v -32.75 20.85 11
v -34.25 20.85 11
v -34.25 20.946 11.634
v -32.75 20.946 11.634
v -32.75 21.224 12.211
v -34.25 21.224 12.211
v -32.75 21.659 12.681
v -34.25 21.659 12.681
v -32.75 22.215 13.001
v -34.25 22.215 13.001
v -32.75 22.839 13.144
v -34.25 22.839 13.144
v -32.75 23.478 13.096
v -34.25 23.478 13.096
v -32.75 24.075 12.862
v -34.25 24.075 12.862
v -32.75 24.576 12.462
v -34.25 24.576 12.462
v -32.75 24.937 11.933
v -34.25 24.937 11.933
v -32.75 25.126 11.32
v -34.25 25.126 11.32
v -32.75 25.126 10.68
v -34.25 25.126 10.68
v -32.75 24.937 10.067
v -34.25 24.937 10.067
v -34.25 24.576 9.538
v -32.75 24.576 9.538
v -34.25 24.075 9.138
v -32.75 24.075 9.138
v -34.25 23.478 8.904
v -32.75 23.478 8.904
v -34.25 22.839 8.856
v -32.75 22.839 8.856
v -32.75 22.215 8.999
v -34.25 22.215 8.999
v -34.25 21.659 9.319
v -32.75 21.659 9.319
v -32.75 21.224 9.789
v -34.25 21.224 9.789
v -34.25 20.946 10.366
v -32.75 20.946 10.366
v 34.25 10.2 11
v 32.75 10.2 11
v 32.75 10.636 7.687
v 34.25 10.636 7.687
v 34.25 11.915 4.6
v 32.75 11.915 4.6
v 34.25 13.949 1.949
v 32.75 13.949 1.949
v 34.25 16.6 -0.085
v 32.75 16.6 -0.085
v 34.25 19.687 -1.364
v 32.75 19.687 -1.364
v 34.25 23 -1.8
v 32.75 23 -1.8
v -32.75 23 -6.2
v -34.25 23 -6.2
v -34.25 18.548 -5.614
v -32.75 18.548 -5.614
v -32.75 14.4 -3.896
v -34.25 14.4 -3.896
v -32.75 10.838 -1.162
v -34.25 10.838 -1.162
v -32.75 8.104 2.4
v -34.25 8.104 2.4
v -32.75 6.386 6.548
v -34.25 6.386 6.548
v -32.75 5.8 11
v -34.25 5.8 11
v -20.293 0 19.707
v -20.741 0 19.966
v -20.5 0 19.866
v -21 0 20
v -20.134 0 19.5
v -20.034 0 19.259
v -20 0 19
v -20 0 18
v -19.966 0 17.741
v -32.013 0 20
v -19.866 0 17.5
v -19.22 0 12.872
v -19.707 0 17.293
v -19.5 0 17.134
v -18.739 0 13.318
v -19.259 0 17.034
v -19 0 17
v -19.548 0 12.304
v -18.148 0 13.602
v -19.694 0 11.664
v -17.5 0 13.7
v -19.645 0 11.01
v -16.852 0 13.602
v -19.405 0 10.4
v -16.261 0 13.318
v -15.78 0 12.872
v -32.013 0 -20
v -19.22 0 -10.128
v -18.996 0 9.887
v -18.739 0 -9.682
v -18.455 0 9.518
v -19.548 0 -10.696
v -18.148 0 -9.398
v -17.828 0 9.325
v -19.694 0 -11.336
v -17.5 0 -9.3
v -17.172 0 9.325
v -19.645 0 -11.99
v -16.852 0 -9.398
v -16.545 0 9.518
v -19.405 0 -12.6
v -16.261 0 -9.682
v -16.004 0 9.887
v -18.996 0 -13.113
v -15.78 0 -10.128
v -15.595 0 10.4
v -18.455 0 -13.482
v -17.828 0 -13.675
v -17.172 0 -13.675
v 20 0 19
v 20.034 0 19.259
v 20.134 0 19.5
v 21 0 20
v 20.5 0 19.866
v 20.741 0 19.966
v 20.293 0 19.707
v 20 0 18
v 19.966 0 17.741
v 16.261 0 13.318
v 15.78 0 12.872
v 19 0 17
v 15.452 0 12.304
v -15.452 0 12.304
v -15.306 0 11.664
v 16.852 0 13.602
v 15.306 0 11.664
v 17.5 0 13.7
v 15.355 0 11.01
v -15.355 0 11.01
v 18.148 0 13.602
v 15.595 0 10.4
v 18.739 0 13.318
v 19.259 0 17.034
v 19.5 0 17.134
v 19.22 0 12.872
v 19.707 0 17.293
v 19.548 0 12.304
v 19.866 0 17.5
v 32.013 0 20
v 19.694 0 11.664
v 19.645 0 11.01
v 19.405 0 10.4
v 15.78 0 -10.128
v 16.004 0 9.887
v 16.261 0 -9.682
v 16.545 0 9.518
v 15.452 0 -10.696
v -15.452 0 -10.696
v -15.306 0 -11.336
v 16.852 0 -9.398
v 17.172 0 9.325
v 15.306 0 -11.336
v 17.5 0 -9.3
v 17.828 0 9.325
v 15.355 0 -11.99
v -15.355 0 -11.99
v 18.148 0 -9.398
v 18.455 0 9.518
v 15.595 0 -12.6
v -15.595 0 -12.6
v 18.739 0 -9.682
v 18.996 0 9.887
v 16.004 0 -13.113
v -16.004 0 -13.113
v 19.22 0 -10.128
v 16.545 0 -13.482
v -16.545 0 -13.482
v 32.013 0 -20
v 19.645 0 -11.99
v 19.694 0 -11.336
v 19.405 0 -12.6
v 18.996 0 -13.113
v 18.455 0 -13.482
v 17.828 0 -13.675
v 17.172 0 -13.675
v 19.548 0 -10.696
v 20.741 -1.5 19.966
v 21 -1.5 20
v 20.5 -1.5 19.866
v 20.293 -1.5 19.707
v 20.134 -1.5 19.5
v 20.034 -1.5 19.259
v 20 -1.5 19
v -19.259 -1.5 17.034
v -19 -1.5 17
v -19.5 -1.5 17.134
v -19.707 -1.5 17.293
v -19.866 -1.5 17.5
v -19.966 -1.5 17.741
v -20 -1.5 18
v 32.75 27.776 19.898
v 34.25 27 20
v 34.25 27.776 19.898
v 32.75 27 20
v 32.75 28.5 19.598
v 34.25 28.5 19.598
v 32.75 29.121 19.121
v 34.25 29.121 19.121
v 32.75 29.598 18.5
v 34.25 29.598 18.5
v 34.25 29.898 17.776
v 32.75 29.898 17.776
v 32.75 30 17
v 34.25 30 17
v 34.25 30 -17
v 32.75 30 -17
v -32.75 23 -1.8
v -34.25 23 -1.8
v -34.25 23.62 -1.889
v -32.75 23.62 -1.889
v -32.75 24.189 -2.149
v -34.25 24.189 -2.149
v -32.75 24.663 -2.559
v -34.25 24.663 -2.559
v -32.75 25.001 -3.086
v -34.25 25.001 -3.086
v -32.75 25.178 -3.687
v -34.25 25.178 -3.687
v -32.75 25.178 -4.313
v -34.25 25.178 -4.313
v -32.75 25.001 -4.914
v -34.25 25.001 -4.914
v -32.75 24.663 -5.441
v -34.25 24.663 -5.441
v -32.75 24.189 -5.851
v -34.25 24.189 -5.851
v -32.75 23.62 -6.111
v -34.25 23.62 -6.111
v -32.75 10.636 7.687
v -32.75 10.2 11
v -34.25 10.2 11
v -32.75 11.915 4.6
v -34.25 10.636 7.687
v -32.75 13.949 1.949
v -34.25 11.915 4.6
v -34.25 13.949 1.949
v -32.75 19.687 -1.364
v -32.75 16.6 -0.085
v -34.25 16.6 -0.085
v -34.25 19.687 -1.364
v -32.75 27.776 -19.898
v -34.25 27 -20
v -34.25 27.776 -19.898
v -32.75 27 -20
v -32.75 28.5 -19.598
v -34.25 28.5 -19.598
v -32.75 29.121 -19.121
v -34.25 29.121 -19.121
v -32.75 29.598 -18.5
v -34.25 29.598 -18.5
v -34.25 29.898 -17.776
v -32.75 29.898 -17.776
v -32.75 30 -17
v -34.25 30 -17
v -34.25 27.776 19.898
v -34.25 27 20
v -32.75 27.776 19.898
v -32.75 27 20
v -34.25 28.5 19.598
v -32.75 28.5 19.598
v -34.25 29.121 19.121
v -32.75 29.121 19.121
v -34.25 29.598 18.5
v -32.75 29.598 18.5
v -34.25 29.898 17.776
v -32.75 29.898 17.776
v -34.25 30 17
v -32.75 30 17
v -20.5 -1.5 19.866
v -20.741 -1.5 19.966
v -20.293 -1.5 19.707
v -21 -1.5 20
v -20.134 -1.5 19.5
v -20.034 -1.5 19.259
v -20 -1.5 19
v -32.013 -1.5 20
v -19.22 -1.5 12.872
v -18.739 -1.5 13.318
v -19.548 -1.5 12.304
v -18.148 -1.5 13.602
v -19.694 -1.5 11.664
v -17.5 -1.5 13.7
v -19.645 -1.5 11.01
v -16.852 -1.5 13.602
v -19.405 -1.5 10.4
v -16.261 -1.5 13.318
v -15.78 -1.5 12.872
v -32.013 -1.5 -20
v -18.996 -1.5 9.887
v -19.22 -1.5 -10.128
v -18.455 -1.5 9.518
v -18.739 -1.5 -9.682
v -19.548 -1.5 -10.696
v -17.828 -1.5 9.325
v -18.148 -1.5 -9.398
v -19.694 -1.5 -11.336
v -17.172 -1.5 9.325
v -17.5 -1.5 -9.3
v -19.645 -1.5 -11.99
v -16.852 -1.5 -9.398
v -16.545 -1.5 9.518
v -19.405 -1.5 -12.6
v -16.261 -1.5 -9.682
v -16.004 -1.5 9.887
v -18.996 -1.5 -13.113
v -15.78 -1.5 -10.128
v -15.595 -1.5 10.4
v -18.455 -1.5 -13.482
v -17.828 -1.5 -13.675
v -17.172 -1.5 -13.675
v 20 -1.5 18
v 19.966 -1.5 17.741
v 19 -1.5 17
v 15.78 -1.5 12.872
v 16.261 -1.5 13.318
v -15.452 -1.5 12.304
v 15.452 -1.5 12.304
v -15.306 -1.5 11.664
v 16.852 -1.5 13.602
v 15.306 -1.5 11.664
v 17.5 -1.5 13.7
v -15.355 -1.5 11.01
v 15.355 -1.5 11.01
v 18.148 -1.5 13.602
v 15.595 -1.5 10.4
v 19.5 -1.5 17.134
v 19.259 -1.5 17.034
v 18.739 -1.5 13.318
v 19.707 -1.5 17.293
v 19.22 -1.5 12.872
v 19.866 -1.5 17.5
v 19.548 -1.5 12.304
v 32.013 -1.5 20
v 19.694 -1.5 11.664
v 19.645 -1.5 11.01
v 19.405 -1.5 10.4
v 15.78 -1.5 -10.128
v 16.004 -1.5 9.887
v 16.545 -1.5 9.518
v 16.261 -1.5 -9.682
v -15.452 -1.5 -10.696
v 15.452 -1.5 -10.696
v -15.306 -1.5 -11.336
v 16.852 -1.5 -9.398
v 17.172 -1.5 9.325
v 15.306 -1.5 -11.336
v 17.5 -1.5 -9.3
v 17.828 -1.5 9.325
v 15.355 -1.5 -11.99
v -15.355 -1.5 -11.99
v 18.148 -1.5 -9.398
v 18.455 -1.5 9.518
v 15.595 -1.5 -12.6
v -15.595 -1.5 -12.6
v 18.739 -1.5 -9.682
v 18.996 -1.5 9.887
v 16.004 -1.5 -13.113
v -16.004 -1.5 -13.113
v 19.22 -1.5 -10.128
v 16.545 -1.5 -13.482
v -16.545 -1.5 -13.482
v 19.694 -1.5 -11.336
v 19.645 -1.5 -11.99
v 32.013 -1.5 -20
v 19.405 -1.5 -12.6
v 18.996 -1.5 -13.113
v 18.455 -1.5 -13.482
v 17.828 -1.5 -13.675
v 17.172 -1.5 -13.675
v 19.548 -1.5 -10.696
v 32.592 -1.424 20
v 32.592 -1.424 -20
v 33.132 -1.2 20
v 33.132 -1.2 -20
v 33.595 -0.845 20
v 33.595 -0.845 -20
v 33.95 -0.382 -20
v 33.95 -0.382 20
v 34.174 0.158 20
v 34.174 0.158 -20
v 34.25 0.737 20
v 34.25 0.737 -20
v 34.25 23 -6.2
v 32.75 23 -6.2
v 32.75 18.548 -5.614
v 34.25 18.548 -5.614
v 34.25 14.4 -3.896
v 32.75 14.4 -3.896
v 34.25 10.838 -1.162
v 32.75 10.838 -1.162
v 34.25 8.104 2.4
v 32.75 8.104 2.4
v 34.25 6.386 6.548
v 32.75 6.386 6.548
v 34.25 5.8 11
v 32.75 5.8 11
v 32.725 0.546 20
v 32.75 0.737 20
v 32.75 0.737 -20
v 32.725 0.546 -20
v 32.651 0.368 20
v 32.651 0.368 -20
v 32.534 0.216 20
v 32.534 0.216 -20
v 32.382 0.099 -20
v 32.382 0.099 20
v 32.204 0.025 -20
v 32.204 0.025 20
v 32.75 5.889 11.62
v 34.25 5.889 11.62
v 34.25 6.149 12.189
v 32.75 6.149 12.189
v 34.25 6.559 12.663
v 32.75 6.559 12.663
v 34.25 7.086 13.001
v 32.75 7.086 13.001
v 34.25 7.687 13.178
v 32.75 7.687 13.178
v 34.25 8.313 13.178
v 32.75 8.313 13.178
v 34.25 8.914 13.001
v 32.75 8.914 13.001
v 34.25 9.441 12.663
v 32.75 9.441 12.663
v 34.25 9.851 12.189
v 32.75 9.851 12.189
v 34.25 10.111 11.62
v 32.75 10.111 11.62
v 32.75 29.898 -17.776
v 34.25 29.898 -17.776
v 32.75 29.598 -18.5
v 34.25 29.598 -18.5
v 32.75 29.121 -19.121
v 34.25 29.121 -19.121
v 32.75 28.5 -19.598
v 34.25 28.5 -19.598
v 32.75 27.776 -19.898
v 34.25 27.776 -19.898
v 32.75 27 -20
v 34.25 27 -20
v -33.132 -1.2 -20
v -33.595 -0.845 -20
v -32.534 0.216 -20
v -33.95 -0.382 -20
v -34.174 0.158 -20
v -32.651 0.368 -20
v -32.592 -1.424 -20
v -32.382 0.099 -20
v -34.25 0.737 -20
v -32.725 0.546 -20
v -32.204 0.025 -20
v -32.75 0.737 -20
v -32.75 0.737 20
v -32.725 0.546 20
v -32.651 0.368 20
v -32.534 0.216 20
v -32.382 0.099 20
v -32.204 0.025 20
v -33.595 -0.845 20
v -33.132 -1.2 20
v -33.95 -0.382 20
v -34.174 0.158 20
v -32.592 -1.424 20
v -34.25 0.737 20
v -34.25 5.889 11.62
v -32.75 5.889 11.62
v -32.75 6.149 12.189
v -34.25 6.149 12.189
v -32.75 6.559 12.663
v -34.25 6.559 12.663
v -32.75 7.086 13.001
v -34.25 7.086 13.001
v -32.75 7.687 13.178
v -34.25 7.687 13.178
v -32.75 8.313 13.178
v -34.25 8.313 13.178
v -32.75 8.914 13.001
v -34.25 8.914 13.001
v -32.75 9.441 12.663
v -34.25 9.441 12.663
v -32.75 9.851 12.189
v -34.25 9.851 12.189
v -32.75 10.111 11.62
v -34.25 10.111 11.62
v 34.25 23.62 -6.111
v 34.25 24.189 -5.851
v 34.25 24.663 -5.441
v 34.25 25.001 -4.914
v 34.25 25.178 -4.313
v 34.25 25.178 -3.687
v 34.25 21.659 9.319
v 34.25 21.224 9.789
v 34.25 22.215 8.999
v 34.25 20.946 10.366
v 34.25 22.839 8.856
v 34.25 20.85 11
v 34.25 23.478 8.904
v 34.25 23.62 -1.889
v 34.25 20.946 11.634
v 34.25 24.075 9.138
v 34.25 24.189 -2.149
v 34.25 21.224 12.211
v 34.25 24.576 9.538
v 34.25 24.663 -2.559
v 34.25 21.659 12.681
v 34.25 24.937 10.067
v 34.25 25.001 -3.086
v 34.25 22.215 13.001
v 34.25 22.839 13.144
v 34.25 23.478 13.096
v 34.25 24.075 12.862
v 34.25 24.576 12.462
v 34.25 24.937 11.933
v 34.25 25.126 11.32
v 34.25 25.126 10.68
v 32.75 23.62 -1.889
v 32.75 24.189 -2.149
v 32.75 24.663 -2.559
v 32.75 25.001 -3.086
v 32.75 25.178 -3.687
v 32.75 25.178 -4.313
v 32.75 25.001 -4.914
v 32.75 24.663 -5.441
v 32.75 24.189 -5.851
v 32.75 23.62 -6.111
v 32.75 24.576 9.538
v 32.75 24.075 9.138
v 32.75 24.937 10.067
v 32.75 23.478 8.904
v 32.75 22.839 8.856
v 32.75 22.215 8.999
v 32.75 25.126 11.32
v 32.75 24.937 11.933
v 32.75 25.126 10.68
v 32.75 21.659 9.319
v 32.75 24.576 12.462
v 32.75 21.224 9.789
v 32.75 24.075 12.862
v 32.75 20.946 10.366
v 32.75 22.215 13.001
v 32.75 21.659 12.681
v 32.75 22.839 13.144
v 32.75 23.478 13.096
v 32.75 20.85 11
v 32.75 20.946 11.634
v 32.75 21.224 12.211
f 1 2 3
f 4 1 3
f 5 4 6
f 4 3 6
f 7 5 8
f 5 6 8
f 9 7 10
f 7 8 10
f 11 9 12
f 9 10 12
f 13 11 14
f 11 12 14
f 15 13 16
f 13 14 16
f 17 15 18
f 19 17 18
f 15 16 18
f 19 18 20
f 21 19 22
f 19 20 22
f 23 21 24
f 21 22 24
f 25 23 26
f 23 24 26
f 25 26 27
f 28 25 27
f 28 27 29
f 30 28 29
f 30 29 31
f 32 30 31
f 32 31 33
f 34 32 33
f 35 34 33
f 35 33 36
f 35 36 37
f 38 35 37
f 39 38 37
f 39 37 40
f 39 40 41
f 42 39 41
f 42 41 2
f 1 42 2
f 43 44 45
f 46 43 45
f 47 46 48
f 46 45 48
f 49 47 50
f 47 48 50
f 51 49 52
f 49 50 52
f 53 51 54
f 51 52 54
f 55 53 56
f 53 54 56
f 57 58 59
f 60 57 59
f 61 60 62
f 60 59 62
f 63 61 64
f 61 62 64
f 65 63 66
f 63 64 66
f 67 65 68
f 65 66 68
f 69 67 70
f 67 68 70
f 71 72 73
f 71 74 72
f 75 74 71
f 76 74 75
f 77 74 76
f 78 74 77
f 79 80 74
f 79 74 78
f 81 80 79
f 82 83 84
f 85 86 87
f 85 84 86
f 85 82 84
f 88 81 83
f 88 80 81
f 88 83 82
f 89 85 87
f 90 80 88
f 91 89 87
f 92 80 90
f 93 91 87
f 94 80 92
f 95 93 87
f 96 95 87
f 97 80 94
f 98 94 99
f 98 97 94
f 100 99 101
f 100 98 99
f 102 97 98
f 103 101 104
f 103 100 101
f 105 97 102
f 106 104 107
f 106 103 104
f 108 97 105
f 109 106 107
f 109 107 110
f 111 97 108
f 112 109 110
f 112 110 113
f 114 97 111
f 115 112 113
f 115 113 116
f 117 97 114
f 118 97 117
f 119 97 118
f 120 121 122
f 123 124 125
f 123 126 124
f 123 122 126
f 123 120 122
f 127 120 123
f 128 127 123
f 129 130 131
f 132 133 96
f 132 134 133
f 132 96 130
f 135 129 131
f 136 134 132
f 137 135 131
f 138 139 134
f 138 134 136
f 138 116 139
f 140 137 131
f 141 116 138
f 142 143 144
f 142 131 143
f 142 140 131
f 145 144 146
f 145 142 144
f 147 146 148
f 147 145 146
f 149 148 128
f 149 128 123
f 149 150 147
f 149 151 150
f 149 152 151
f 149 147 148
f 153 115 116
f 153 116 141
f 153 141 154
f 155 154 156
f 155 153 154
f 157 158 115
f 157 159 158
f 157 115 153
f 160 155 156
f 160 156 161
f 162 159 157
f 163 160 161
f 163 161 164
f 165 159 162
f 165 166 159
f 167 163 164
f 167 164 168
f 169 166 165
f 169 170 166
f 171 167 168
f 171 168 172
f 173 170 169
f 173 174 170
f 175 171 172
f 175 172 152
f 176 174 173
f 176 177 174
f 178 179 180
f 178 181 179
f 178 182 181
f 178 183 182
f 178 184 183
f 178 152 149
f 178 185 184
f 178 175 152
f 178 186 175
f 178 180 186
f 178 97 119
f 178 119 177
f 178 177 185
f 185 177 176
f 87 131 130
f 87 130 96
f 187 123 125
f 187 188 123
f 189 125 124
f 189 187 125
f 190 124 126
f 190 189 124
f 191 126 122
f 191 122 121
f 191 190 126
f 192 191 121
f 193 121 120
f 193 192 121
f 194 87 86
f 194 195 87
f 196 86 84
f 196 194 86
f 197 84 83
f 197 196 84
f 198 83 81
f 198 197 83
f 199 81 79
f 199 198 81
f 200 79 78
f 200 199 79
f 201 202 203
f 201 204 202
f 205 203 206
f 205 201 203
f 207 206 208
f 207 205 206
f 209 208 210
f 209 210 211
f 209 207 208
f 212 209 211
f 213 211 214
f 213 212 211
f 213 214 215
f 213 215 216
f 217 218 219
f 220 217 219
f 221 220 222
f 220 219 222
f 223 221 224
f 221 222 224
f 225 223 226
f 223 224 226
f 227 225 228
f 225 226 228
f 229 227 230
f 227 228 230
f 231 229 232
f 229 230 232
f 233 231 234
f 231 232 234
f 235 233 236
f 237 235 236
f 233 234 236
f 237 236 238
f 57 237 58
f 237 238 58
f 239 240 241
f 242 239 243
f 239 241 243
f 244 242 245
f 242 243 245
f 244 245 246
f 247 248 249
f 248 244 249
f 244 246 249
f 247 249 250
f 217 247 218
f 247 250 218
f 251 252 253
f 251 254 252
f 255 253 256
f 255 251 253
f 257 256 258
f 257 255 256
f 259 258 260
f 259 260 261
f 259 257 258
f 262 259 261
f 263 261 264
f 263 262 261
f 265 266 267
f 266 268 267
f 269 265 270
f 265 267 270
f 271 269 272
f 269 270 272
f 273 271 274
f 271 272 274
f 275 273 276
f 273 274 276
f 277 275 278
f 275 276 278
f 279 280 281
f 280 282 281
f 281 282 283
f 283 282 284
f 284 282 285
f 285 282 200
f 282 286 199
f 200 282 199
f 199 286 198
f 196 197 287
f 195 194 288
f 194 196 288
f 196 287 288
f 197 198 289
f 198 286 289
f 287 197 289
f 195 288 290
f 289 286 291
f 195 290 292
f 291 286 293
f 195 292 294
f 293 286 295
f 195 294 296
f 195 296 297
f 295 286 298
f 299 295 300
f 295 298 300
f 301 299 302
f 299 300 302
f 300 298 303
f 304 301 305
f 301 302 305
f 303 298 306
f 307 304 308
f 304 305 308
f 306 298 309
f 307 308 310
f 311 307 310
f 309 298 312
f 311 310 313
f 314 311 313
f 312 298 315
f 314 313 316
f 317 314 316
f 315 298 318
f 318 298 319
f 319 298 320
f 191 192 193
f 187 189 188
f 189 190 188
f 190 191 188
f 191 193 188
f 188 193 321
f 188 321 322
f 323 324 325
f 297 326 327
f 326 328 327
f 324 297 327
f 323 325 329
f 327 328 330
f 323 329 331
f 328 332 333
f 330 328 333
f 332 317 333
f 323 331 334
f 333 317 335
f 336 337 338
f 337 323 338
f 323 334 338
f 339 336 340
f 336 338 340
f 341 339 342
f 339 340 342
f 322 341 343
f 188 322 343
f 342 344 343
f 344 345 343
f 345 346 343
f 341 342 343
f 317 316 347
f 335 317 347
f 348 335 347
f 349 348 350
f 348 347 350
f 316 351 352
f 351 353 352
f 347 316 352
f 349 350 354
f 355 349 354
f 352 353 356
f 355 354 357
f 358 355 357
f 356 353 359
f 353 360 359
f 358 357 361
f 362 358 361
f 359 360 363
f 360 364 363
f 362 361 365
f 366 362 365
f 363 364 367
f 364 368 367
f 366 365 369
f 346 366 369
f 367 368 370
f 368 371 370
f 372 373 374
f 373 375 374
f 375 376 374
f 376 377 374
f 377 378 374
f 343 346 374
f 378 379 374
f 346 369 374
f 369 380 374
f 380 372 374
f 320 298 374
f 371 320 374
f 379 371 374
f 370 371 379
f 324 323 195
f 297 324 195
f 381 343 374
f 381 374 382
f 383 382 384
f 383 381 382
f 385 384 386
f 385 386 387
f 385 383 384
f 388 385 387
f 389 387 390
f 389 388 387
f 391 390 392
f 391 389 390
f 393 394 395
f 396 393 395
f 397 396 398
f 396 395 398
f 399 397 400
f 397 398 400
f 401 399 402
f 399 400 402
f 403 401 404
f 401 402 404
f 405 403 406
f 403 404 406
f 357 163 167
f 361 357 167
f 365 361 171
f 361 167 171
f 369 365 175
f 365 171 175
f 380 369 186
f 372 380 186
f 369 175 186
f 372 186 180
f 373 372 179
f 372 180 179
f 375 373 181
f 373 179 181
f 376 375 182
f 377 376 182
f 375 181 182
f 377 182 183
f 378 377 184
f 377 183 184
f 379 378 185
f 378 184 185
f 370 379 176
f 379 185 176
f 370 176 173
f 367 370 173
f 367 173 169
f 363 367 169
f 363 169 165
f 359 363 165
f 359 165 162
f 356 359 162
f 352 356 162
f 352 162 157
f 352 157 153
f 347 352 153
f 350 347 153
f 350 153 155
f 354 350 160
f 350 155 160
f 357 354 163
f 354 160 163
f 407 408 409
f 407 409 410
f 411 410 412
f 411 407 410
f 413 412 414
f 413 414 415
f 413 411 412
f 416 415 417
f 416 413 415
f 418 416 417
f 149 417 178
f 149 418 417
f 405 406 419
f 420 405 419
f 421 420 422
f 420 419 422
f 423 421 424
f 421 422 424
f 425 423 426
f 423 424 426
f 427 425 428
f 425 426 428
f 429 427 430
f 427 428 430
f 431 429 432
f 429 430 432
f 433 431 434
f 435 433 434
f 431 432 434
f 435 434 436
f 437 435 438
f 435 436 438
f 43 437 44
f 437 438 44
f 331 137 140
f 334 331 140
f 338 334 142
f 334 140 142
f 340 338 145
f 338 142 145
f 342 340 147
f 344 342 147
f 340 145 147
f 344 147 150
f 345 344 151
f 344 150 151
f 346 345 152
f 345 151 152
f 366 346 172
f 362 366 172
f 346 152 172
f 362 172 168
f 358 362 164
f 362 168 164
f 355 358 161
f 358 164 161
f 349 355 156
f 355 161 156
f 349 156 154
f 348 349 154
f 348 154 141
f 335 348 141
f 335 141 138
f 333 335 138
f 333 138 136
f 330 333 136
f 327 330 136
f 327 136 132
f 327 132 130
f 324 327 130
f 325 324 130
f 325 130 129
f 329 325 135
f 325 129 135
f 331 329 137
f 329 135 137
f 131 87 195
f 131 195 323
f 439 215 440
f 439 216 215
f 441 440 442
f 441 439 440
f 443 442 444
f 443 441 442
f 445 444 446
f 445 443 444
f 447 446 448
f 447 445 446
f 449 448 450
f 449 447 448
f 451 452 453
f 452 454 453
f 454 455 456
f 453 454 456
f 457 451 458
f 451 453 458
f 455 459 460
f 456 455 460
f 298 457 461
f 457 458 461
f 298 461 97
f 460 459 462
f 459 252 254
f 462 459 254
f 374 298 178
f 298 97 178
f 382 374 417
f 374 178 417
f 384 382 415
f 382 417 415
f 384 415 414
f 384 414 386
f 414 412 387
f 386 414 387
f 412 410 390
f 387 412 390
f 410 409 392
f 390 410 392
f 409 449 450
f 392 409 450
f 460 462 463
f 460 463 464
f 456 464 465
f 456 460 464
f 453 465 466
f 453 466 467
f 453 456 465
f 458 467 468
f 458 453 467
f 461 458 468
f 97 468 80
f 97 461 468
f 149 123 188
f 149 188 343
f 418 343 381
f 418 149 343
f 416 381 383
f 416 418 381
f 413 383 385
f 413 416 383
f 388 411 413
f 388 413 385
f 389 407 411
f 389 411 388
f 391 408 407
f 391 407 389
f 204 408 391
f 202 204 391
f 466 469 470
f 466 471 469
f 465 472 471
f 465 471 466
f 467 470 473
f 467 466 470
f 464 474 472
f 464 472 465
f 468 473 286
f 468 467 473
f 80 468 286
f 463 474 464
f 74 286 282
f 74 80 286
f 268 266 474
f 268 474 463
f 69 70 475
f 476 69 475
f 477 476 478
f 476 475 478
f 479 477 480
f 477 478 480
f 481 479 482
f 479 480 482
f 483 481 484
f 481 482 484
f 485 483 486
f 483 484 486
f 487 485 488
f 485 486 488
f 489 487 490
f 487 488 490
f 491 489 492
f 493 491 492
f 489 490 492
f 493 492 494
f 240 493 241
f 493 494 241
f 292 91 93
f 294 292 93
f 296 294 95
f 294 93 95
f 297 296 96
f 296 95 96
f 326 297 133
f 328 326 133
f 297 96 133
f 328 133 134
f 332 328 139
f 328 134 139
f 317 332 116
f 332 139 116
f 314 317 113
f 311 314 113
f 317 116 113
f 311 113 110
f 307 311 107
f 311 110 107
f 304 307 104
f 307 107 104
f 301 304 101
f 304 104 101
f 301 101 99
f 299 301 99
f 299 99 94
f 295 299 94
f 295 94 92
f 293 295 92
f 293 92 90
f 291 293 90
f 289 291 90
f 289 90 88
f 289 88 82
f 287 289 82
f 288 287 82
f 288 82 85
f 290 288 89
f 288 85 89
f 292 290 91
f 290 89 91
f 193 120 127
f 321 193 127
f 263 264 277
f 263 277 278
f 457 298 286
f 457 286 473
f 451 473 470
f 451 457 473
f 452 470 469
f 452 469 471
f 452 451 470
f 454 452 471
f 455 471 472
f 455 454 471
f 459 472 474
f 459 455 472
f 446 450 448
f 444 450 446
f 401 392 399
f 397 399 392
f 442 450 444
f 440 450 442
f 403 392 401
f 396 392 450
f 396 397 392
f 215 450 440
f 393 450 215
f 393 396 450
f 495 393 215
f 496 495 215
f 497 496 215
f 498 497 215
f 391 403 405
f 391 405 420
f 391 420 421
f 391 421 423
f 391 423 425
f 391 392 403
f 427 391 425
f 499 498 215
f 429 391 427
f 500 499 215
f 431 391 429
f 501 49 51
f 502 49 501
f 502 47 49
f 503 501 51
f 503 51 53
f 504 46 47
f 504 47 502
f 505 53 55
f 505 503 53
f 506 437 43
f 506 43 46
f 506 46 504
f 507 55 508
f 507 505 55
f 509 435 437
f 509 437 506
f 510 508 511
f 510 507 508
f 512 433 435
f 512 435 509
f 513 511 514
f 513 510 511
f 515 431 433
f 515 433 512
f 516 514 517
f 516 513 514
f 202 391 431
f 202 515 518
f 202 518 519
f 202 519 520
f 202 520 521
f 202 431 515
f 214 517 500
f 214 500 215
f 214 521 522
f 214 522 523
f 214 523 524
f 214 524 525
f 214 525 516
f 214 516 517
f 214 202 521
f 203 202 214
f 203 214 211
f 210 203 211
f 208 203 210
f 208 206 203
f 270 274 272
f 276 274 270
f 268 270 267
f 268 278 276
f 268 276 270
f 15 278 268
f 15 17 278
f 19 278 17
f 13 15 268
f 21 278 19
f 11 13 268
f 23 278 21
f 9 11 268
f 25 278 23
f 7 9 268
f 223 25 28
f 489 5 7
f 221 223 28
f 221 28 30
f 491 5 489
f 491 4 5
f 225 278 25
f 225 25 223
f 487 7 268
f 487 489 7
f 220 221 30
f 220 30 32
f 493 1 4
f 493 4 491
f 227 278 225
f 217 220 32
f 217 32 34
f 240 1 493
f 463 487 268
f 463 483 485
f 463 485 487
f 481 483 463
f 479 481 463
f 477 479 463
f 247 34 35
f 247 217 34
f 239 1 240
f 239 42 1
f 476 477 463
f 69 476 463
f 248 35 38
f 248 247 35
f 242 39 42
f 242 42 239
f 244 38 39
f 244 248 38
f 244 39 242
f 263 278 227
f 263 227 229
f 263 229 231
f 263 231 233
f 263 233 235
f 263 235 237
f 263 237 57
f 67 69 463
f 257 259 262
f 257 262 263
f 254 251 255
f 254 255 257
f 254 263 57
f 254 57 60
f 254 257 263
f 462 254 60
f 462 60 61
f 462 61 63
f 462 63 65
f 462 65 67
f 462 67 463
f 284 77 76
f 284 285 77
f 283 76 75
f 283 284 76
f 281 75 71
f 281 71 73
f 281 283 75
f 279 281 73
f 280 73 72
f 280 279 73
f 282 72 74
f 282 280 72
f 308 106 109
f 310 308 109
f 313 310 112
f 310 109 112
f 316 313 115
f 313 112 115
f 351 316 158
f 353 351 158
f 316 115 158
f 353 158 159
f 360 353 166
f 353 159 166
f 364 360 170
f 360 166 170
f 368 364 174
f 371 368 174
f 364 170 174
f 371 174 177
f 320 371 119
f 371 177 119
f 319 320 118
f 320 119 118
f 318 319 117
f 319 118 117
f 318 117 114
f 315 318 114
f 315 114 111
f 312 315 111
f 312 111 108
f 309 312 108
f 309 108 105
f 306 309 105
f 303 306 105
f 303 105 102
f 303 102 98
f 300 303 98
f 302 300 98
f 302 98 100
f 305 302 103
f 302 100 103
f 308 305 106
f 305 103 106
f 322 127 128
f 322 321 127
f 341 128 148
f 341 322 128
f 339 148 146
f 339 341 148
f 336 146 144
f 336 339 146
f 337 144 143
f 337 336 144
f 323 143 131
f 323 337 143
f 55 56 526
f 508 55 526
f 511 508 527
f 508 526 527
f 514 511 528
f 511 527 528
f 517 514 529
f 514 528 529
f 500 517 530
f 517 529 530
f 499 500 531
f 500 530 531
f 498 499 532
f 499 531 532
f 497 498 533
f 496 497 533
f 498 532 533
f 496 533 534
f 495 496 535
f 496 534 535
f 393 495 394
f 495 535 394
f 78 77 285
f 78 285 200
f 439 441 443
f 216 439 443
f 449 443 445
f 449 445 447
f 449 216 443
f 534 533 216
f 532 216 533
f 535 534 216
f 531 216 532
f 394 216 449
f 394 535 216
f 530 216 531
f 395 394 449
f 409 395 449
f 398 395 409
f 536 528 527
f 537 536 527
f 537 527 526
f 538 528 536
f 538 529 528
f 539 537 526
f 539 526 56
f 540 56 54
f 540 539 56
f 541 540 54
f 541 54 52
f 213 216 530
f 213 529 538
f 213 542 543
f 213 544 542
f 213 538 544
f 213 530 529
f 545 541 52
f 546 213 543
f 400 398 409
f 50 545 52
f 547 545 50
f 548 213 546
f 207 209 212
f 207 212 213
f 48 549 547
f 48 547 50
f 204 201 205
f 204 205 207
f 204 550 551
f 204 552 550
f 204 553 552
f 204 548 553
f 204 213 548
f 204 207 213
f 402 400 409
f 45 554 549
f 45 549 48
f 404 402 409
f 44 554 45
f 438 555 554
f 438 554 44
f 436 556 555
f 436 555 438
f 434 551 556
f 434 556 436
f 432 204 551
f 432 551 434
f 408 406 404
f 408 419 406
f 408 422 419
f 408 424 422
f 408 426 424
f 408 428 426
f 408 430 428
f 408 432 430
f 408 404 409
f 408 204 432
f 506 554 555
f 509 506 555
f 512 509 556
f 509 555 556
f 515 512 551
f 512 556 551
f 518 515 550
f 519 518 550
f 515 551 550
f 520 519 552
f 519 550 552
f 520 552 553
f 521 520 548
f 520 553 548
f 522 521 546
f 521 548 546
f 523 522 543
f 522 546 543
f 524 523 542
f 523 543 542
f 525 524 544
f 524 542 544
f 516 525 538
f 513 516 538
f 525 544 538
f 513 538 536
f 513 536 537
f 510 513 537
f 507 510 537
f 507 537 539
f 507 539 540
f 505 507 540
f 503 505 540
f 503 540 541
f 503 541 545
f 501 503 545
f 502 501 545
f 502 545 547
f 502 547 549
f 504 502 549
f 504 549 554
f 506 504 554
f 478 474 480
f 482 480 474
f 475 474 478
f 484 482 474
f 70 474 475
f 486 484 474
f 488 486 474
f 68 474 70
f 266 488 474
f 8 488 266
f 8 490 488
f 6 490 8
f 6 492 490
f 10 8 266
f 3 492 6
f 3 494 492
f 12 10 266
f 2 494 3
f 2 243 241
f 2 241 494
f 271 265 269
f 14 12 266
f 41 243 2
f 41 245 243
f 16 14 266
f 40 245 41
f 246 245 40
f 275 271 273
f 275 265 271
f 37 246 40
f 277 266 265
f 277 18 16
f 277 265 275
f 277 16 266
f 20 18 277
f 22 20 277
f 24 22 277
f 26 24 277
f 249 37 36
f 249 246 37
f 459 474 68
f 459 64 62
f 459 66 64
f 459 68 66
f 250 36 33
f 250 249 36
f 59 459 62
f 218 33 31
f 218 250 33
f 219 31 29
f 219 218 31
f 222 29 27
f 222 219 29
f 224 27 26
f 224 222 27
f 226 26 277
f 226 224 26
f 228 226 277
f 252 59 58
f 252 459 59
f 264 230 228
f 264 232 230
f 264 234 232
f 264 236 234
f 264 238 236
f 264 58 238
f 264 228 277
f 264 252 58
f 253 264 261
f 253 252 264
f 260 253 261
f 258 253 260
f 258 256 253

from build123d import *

# Parameters (mm, degrees)
SKETCH_1_W                         = 65.5
SKETCH_1_H                         = 40
SKETCH_1_R                         = 2.2
SM_BASE_FLANGE_1_DEPTH             = 1.5
SM_EDGE_FLANGE_1_STRIP_W           = 7.4732
SM_EDGE_FLANGE_1_STRIP_H           = 1.5
SM_EDGE_FLANGE_1_STRIP_CUT_DEPTH   = 40
SM_EDGE_FLANGE_1_STRIP_2_W         = 7.4732
SM_EDGE_FLANGE_1_STRIP_2_H         = 1.5
SM_EDGE_FLANGE_1_STRIP_CUT_2_DEPTH = 40
SM_EDGE_FLANGE_1_DEPTH             = 40
SM_EDGE_FLANGE_1_BEND_DEPTH        = 40
SKETCH_12_R                        = 2.15
CUT_EXTRUDE_1_DEPTH                = 78.409624725
SKETCH_13_W                        = 40
SKETCH_13_H                        = 3
CUT_EXTRUDE_2_DEPTH                = 50.729895435
FILLET_1_R                         = 1
FILLET_2_R                         = 3


# Sheet-metal steps are written as plain solids
with BuildPart() as part:
    # Sketch 1 → 基体-法兰1 (new body)
    with BuildSketch(Plane(origin=(0, 0, 0), x_dir=(1, 0, 0), z_dir=(0, 1, 0))):
        Rectangle(SKETCH_1_W, SKETCH_1_H)
        with Locations(Location((-17.5, 11.5, 0), (0, 0, 270))):
            Circle(SKETCH_1_R, mode=Mode.SUBTRACT)
        with Locations(Location((17.5, 11.5, 0), (0, 0, 270))):
            Circle(SKETCH_1_R, mode=Mode.SUBTRACT)
        with Locations(Location((17.5, -11.5, 0), (0, 0, 270))):
            Circle(SKETCH_1_R, mode=Mode.SUBTRACT)
        with Locations(Location((-17.5, -11.5, 0), (0, 0, 270))):
            Circle(SKETCH_1_R, mode=Mode.SUBTRACT)
    extrude(amount=-SM_BASE_FLANGE_1_DEPTH)

    # 边线-法兰1 strip (across the edge) → 边线-法兰1 strip cut (cut)
    with BuildSketch(Plane(origin=(-32.75, 0, -20), x_dir=(1, 0, 0), z_dir=(0, 0, 1))):
        with Locations((-3, -0.75)):
            Rectangle(SM_EDGE_FLANGE_1_STRIP_W, SM_EDGE_FLANGE_1_STRIP_H)
    extrude(amount=SM_EDGE_FLANGE_1_STRIP_CUT_DEPTH, mode=Mode.SUBTRACT)

    # 边线-法兰1 strip 2 (across the edge) → 边线-法兰1 strip cut 2 (cut)
    with BuildSketch(Plane(origin=(32.75, 0, 20), x_dir=(-1, 0, 0), z_dir=(0, 0, -1))):
        with Locations((-3, -0.75)):
            Rectangle(SM_EDGE_FLANGE_1_STRIP_2_W, SM_EDGE_FLANGE_1_STRIP_2_H)
    extrude(amount=SM_EDGE_FLANGE_1_STRIP_CUT_2_DEPTH, mode=Mode.SUBTRACT)

    # 边线-法兰1 section (across the edge) → 边线-法兰1 (add)
    with BuildSketch(Plane(origin=(-32.75, 0, -20), x_dir=(1, 0, 0), z_dir=(0, 0, 1))):
        with BuildLine():
            Line((-1.5, 0.7366), (-1.5, 30))
            Line((-1.5, 30), (0, 30))
            Line((0, 30), (0, 0.7366))
            ThreePointArc((0, 0.7366), (0.215745145, 0.215745145), (0.7366, 0))
            Line((0.7366, 0), (0.7366, -1.5))
            ThreePointArc((0.7366, -1.5), (-0.844915027, -0.844915027), (-1.5, 0.7366))
        make_face()
    extrude(amount=SM_EDGE_FLANGE_1_DEPTH)

    # 边线-法兰1 section 2 (across the edge) → 边线-法兰1 bend (add)
    with BuildSketch(Plane(origin=(32.75, 0, 20), x_dir=(-1, 0, 0), z_dir=(0, 0, -1))):
        with BuildLine():
            Line((-1.5, 0.7366), (-1.5, 30))
            Line((-1.5, 30), (0, 30))
            Line((0, 30), (0, 0.7366))
            ThreePointArc((0, 0.7366), (0.215745145, 0.215745145), (0.7366, 0))
            Line((0.7366, 0), (0.7366, -1.5))
            ThreePointArc((0.7366, -1.5), (-0.844915027, -0.844915027), (-1.5, 0.7366))
        make_face()
    extrude(amount=SM_EDGE_FLANGE_1_BEND_DEPTH)

    # 草图12 → 切除-拉伸1 (cut, through all)
    with BuildSketch(Plane.ZY.offset(34.25)):
        with Locations(Location((11, 23, 0), (0, 0, 270))):
            Circle(SKETCH_12_R)
        with BuildLine():
            ThreePointArc((-6.2, 23), (-1.162236636, 10.837763364), (11, 5.8))
            ThreePointArc((11, 5.8), (13.2, 8), (11, 10.2))
            ThreePointArc((11, 10.2), (1.949033201, 13.949033201), (-1.8, 23))
            ThreePointArc((-1.8, 23), (-4, 25.2), (-6.2, 23))
        make_face()
    extrude(amount=-CUT_EXTRUDE_1_DEPTH, mode=Mode.SUBTRACT)

    # 草图13 → 切除-拉伸2 (cut, through all)
    with BuildSketch(Plane(origin=(0, 0, 0), x_dir=(1, 0, 0), z_dir=(0, 1, 0))):
        with Locations((0, -18.5)):
            Rectangle(SKETCH_13_W, SKETCH_13_H)
    extrude(amount=-CUT_EXTRUDE_2_DEPTH, mode=Mode.SUBTRACT)

    # 圆角1
    fillet_1_edges = [part.edges().sort_by_distance(p)[0] for p in [
        (-20, -0.75, 20),
        (-20, -0.75, 17),
        (20, -0.75, 17),
        (20, -0.75, 20),
    ]]
    fillet(fillet_1_edges, radius=FILLET_1_R)

    # 圆角2
    fillet_2_edges = [part.edges().sort_by_distance(p)[0] for p in [
        (-33.5, 30, -20),
        (-33.5, 30, 20),
        (33.5, 30, 20),
        (33.5, 30, -20),
    ]]
    fillet(fillet_2_edges, radius=FILLET_2_R)


solid = part.part
